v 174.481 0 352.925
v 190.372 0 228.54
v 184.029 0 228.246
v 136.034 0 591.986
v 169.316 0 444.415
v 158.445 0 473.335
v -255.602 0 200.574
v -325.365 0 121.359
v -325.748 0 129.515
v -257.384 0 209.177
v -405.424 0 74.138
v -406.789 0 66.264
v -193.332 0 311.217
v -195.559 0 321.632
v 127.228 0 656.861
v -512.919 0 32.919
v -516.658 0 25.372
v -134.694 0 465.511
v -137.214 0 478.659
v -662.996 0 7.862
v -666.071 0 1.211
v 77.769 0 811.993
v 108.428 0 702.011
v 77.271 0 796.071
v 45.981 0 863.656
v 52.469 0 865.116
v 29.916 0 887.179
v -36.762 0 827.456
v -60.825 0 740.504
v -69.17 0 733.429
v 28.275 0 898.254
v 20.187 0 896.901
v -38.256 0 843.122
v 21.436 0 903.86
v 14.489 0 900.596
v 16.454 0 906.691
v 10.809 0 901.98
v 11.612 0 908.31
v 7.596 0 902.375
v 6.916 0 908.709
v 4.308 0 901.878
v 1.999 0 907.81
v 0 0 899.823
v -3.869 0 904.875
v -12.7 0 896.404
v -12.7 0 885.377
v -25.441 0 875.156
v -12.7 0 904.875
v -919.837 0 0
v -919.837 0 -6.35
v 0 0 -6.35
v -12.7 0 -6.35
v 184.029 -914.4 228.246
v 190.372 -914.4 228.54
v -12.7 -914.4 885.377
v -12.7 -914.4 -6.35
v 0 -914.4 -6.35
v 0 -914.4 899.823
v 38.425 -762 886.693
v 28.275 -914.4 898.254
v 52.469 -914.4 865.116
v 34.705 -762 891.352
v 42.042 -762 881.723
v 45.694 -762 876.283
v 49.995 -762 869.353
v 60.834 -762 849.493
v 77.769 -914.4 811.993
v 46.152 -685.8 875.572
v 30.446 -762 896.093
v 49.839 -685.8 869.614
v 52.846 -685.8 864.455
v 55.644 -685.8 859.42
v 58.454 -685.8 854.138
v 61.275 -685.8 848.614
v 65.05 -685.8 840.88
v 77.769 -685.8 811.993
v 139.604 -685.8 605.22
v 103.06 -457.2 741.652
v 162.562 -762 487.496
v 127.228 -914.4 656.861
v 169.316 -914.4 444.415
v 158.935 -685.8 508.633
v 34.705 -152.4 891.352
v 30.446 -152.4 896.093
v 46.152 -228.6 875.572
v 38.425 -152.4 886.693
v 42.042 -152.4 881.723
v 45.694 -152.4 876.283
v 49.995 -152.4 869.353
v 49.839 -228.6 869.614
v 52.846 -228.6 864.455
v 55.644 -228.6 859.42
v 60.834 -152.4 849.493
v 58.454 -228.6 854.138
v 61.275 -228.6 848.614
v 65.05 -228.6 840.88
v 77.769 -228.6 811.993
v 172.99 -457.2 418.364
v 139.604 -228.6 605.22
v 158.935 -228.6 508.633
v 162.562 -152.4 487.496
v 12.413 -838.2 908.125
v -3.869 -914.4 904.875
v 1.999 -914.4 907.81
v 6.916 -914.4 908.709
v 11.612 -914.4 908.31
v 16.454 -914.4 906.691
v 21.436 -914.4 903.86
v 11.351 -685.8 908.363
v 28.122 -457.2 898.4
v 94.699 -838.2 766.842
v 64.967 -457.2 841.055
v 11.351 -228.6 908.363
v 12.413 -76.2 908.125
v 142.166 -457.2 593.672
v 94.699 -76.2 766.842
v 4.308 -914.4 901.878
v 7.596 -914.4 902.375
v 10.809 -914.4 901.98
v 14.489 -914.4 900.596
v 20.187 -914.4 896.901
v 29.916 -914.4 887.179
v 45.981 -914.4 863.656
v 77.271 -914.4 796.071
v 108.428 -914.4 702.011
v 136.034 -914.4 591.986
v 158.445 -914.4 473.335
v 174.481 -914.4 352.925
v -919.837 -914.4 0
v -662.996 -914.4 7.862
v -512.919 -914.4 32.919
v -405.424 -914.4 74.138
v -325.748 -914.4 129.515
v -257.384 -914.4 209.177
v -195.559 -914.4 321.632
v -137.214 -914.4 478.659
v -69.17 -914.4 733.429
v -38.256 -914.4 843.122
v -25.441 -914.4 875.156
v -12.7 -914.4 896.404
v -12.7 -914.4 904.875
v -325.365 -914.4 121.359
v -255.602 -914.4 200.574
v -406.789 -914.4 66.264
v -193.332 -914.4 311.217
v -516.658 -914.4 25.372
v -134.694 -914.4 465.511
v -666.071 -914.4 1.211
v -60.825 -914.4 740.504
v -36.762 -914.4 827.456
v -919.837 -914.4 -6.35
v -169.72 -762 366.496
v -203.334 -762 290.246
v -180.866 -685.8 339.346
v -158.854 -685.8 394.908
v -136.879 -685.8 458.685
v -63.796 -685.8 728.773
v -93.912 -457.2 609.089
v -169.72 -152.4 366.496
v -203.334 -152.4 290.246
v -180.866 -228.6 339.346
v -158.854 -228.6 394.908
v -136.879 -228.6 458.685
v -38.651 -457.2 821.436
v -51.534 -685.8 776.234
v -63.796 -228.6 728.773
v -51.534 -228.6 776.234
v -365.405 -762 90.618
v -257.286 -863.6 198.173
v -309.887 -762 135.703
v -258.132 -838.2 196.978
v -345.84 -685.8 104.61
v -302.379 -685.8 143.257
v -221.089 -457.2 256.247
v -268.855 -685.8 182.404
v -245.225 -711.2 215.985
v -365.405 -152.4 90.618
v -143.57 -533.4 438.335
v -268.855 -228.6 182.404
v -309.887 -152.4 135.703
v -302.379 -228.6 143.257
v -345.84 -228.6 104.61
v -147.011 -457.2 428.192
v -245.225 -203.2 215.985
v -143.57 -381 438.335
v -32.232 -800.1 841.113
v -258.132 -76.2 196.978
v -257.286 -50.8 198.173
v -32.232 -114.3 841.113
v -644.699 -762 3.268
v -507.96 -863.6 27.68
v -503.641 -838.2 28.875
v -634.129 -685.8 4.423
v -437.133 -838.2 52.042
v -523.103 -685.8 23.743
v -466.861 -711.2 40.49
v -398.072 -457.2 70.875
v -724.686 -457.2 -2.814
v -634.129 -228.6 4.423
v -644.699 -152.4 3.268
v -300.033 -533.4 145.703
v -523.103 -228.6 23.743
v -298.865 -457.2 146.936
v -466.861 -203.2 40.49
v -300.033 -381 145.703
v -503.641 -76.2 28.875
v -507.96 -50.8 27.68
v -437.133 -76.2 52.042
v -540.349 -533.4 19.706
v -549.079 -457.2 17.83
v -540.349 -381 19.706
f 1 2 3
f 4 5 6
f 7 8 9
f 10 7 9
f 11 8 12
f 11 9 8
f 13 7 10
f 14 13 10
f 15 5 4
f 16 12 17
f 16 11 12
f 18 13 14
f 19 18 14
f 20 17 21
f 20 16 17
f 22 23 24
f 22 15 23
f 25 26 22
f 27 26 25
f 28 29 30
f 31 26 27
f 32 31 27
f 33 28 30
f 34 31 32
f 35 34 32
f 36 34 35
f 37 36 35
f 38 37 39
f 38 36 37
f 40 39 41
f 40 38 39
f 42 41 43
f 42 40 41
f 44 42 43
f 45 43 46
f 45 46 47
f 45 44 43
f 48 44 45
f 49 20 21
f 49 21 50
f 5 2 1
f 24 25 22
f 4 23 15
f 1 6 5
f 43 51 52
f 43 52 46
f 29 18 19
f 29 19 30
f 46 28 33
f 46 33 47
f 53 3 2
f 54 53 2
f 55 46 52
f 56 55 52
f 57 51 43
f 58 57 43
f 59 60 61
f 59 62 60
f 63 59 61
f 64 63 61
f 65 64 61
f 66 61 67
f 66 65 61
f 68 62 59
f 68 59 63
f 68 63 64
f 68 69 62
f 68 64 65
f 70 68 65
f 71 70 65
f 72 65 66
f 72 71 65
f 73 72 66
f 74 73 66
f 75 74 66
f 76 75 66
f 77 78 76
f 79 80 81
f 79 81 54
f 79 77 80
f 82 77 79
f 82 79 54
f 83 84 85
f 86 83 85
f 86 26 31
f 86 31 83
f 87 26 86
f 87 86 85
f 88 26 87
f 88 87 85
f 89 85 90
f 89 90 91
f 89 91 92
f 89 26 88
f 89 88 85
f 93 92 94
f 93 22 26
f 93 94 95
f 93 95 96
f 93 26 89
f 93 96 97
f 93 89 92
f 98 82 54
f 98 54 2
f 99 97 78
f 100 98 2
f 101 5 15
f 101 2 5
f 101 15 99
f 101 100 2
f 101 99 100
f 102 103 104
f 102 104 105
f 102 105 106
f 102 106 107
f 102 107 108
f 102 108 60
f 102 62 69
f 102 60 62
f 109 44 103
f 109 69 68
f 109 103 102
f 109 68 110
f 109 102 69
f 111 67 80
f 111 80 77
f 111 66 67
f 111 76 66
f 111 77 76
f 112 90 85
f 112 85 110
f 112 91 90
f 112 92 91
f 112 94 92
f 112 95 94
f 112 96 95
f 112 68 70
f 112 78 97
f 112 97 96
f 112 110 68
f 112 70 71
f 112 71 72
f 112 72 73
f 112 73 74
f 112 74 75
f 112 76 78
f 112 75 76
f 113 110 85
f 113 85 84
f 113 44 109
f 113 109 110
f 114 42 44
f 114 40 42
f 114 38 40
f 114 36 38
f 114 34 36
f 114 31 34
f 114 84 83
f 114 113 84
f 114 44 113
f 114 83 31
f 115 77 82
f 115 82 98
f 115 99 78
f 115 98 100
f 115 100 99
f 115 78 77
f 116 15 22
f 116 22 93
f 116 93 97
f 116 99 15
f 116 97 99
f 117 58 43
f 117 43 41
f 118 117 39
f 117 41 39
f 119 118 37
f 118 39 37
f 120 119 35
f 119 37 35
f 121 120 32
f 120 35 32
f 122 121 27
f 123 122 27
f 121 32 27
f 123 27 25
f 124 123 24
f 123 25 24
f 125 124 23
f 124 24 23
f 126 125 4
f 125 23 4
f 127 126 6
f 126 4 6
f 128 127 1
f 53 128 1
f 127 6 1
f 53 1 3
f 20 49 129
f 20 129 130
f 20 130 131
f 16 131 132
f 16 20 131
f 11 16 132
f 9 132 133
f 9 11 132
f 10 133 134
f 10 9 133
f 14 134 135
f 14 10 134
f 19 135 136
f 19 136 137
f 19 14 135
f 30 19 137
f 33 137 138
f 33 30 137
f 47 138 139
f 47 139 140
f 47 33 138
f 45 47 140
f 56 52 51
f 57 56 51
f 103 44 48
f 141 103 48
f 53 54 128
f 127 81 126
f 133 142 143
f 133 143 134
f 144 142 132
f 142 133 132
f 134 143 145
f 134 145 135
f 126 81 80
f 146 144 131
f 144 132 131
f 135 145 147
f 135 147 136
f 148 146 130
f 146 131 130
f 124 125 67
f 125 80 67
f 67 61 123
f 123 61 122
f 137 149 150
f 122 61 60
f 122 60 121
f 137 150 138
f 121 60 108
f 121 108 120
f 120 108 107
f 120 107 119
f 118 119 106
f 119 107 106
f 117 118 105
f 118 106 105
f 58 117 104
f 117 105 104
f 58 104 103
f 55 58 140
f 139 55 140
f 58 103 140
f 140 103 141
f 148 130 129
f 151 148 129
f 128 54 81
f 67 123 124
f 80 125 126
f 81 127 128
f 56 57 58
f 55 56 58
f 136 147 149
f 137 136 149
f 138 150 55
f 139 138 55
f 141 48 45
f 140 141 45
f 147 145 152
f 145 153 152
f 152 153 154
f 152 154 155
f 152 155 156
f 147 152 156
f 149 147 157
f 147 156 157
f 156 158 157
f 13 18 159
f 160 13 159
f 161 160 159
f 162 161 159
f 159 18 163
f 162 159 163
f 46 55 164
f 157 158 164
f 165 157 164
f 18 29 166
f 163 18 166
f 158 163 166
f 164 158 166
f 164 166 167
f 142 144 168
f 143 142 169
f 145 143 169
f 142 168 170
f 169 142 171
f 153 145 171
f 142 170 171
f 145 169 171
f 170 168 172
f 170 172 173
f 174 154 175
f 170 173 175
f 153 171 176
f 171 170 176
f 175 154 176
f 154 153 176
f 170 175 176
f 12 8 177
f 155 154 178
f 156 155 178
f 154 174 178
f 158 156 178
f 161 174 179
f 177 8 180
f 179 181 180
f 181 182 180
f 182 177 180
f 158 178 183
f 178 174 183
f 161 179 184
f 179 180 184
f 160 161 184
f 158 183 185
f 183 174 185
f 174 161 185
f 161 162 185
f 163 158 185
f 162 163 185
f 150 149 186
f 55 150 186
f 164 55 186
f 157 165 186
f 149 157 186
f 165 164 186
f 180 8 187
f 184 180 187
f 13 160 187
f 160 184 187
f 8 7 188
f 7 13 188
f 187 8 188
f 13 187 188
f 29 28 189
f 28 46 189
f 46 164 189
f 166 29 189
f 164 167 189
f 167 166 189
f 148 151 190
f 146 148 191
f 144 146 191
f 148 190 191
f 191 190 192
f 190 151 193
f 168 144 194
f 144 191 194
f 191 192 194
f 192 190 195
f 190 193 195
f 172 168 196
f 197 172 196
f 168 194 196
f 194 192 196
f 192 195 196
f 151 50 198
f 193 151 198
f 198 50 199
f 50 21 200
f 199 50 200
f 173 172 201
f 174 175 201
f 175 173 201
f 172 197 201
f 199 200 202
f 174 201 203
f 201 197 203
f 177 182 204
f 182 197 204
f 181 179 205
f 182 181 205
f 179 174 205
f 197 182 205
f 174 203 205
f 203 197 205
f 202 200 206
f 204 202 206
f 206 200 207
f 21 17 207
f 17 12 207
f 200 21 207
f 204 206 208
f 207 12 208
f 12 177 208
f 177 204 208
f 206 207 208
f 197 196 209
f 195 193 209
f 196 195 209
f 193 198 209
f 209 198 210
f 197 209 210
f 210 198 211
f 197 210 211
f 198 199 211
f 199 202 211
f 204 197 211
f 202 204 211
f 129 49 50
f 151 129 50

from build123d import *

# Parameters (mm, degrees)
F1_DEPTH = 914.4


# Not quite as in the source:
# - ends of sketch curves that miss each other by under 0.0002 mm in the source are joined
# - the dataset's text gives a spline's control points without its knots; the knots are read off the source's solid


with BuildPart() as f1:
    # F0 (on Front) → F1 (new body)
    with BuildSketch(Plane.XZ):
        with BuildLine():
            add(Edge.make_bspline(
                [(-919.8371731596, 0), (-666.6549326545, 0), (-224.5771125372, 9.857256005), (-90.4120834618, 673.3494347676), (-31.042313376, 873.5728945456), (-12.7, 896.4040661924)],
                knots=[0, 0, 0, 0, 0.2772976129, 0.5617641499, 0.6630198034, 0.6630198034, 0.6630198034, 0.6630198034], degree=3))
            Line((-919.8371731596, 0), (-919.8371731596, -6.35))
            add(Edge.make_bspline(
                [(-919.8371731596, -6.35), (-891.2956817484, -6.35), (-835.0727771699, -6.2264734906), (-753.6955894076, -4.5537616294), (-675.6488494754, -0.2717047035), (-601.3027865804, 7.749478894), (-531.0281070337, 20.6510983897), (-476.1747806697, 36.433071437), (-434.7209643178, 52.6606822547), (-404.9003603349, 66.7779757198), (-376.407262262, 82.9857781471), (-353.8198862803, 98.3520654174), (-336.4752851305, 111.8293289531), (-323.8373430454, 122.5464690045), (-311.5775291009, 133.8876328292), (-299.7039715139, 145.875207016), (-288.2290876414, 158.4866993511), (-273.4422137623, 176.0875345027), (-255.8954652009, 199.4854636313), (-236.2518066429, 229.5516028845), (-211.8312721359, 271.9684188112), (-184.4187186541, 328.7539699263), (-155.8635982627, 401.0055012331), (-131.028728694, 475.4527935567), (-109.3069067738, 550.1778688522), (-90.0991494945, 623.2560938642), (-75.6932560314, 681.1724555189), (-64.8354875196, 724.7427710564), (-56.9528674516, 755.7967634626), (-49.2605256897, 784.9693353051), (-41.6751107234, 811.8671692139), (-34.1167291745, 836.1005454151), (-26.516271345, 857.2638545274), (-20.1072029881, 871.9856586334), (-15.4866518, 880.7508103168), (-13.4472817504, 884.1799958005), (-12.7, 885.3770727094)],
                knots=[0, 0, 0, 0, 0.03125, 0.0625, 0.09375, 0.125, 0.15625, 0.1875, 0.203125, 0.21875, 0.234375, 0.25, 0.2578125, 0.265625, 0.2734375, 0.28125, 0.2890625, 0.296875, 0.3125, 0.328125, 0.34375, 0.375, 0.40625, 0.4375, 0.46875, 0.5, 0.53125, 0.546875, 0.5625, 0.578125, 0.59375, 0.609375, 0.625, 0.640625, 0.6484375, 0.6529650593, 0.6529650593, 0.6529650593, 0.6529650593], degree=3))
            Line((-12.7, 885.3770727094), (-12.7, 896.4040661924))
        make_face()
        with BuildLine():
            Line((-12.7, 904.875), (-12.7, 896.4040661924))
            add(Edge.make_bspline(
                [(-12.7, 896.4040661924), (-9.8289625515, 899.9777238573), (-6.8903732232, 902.823006869), (-3.8687211654, 904.875)],
                knots=[0.6630198034, 0.6630198034, 0.6630198034, 0.6630198034, 0.6788688824, 0.6788688824, 0.6788688824, 0.6788688824], degree=3))
            Line((-3.8687211654, 904.875), (-12.7, 904.875))
        make_face()
        with BuildLine():
            add(Edge.make_bspline(
                [(-12.7, 896.4040661924), (-9.8289625515, 899.9777238573), (-6.8903732232, 902.823006869), (-3.8687211654, 904.875)],
                knots=[0.6630198034, 0.6630198034, 0.6630198034, 0.6630198034, 0.6788688824, 0.6788688824, 0.6788688824, 0.6788688824], degree=3))
            Line((-12.7, 896.4040661924), (-12.7, 885.3770727094))
            add(Edge.make_bspline(
                [(-12.7, 885.3770727094), (-12.1578146641, 886.2456039503), (-10.327872538, 889.0711046998), (-7.2271290281, 893.2451337506), (-3.4946018732, 897.2220843222), (-1.1289437839, 899.0829033781), (0, 899.8227670823)],
                knots=[0.6529650593, 0.6529650593, 0.6529650593, 0.6529650593, 0.65625, 0.6640625, 0.671875, 0.6795490215, 0.6795490215, 0.6795490215, 0.6795490215], degree=3))
            Line((0, 899.8227670823), (0, 904.875))
            Line((0, 904.875), (-3.8687211654, 904.875))
        make_face()
        with BuildLine():
            add(Edge.make_bspline(
                [(-3.8687211654, 904.875), (1.3768159503, 908.437225539), (65.5226358054, 922.1110182588), (174.8235935542, 563.8420495299), (190.3721604559, 228.5401790035)],
                knots=[0.6788688824, 0.6788688824, 0.6788688824, 0.6788688824, 0.7063826167, 1, 1, 1, 1], degree=3))
            Line((-3.8687211654, 904.875), (0, 904.875))
            Line((0, 904.875), (0, 899.8227670823))
            add(Edge.make_bspline(
                [(0, 899.8227670823), (0.0203719127, 899.8361180029), (1.1892498099, 900.5992765813), (2.8626228855, 901.4459342147), (4.9475578198, 902.0833471344), (6.4810971063, 902.345982062), (8.0248389444, 902.405514015), (9.6278327514, 902.2568516663), (11.3272360125, 901.8789926921), (13.1685034705, 901.2342275997), (15.1549787651, 900.2947169392), (17.9792683036, 898.6261359239), (21.7996798698, 895.7330053245), (26.7252350861, 890.9564075118), (31.9010627331, 884.9081499112), (37.2647559638, 877.6325543579), (42.7721833661, 869.1760396376), (50.2634852549, 856.3857689099), (59.838484806, 837.6652789081), (71.5008754365, 811.1500097706), (83.2006513672, 780.8859268301), (94.8138420689, 747.1647527149), (110.0254840172, 697.9743051355), (128.2408613675, 629.2627330137), (147.9185624169, 537.4831514486), (164.5248766535, 438.5937295745), (177.1736880039, 334.8050437488), (182.3793905406, 263.8190463883), (184.0289768201, 228.246033865)],
                knots=[0.6795490215, 0.6795490215, 0.6795490215, 0.6795490215, 0.6796875, 0.6875, 0.69140625, 0.6953125, 0.69921875, 0.703125, 0.70703125, 0.7109375, 0.71484375, 0.71875, 0.7265625, 0.734375, 0.7421875, 0.75, 0.7578125, 0.765625, 0.78125, 0.796875, 0.8125, 0.828125, 0.84375, 0.875, 0.90625, 0.9375, 0.96875, 1, 1, 1, 1], degree=3))
            Line((184.0289768201, 228.246033865), (190.3721604559, 228.5401790035))
        make_face()
        with BuildLine():
            add(Edge.make_bspline(
                [(-12.7, 885.3770727094), (-12.1578146641, 886.2456039503), (-10.327872538, 889.0711046998), (-7.2271290281, 893.2451337506), (-3.4946018732, 897.2220843222), (-1.1289437839, 899.0829033781), (0, 899.8227670823)],
                knots=[0.6529650593, 0.6529650593, 0.6529650593, 0.6529650593, 0.65625, 0.6640625, 0.671875, 0.6795490215, 0.6795490215, 0.6795490215, 0.6795490215], degree=3))
            Line((-12.7, 885.3770727094), (-12.7, -6.35))
            Line((-12.7, -6.35), (0, -6.35))
            Line((0, -6.35), (0, 899.8227670823))
        make_face()
    extrude(amount=F1_DEPTH)


solid = f1.part
